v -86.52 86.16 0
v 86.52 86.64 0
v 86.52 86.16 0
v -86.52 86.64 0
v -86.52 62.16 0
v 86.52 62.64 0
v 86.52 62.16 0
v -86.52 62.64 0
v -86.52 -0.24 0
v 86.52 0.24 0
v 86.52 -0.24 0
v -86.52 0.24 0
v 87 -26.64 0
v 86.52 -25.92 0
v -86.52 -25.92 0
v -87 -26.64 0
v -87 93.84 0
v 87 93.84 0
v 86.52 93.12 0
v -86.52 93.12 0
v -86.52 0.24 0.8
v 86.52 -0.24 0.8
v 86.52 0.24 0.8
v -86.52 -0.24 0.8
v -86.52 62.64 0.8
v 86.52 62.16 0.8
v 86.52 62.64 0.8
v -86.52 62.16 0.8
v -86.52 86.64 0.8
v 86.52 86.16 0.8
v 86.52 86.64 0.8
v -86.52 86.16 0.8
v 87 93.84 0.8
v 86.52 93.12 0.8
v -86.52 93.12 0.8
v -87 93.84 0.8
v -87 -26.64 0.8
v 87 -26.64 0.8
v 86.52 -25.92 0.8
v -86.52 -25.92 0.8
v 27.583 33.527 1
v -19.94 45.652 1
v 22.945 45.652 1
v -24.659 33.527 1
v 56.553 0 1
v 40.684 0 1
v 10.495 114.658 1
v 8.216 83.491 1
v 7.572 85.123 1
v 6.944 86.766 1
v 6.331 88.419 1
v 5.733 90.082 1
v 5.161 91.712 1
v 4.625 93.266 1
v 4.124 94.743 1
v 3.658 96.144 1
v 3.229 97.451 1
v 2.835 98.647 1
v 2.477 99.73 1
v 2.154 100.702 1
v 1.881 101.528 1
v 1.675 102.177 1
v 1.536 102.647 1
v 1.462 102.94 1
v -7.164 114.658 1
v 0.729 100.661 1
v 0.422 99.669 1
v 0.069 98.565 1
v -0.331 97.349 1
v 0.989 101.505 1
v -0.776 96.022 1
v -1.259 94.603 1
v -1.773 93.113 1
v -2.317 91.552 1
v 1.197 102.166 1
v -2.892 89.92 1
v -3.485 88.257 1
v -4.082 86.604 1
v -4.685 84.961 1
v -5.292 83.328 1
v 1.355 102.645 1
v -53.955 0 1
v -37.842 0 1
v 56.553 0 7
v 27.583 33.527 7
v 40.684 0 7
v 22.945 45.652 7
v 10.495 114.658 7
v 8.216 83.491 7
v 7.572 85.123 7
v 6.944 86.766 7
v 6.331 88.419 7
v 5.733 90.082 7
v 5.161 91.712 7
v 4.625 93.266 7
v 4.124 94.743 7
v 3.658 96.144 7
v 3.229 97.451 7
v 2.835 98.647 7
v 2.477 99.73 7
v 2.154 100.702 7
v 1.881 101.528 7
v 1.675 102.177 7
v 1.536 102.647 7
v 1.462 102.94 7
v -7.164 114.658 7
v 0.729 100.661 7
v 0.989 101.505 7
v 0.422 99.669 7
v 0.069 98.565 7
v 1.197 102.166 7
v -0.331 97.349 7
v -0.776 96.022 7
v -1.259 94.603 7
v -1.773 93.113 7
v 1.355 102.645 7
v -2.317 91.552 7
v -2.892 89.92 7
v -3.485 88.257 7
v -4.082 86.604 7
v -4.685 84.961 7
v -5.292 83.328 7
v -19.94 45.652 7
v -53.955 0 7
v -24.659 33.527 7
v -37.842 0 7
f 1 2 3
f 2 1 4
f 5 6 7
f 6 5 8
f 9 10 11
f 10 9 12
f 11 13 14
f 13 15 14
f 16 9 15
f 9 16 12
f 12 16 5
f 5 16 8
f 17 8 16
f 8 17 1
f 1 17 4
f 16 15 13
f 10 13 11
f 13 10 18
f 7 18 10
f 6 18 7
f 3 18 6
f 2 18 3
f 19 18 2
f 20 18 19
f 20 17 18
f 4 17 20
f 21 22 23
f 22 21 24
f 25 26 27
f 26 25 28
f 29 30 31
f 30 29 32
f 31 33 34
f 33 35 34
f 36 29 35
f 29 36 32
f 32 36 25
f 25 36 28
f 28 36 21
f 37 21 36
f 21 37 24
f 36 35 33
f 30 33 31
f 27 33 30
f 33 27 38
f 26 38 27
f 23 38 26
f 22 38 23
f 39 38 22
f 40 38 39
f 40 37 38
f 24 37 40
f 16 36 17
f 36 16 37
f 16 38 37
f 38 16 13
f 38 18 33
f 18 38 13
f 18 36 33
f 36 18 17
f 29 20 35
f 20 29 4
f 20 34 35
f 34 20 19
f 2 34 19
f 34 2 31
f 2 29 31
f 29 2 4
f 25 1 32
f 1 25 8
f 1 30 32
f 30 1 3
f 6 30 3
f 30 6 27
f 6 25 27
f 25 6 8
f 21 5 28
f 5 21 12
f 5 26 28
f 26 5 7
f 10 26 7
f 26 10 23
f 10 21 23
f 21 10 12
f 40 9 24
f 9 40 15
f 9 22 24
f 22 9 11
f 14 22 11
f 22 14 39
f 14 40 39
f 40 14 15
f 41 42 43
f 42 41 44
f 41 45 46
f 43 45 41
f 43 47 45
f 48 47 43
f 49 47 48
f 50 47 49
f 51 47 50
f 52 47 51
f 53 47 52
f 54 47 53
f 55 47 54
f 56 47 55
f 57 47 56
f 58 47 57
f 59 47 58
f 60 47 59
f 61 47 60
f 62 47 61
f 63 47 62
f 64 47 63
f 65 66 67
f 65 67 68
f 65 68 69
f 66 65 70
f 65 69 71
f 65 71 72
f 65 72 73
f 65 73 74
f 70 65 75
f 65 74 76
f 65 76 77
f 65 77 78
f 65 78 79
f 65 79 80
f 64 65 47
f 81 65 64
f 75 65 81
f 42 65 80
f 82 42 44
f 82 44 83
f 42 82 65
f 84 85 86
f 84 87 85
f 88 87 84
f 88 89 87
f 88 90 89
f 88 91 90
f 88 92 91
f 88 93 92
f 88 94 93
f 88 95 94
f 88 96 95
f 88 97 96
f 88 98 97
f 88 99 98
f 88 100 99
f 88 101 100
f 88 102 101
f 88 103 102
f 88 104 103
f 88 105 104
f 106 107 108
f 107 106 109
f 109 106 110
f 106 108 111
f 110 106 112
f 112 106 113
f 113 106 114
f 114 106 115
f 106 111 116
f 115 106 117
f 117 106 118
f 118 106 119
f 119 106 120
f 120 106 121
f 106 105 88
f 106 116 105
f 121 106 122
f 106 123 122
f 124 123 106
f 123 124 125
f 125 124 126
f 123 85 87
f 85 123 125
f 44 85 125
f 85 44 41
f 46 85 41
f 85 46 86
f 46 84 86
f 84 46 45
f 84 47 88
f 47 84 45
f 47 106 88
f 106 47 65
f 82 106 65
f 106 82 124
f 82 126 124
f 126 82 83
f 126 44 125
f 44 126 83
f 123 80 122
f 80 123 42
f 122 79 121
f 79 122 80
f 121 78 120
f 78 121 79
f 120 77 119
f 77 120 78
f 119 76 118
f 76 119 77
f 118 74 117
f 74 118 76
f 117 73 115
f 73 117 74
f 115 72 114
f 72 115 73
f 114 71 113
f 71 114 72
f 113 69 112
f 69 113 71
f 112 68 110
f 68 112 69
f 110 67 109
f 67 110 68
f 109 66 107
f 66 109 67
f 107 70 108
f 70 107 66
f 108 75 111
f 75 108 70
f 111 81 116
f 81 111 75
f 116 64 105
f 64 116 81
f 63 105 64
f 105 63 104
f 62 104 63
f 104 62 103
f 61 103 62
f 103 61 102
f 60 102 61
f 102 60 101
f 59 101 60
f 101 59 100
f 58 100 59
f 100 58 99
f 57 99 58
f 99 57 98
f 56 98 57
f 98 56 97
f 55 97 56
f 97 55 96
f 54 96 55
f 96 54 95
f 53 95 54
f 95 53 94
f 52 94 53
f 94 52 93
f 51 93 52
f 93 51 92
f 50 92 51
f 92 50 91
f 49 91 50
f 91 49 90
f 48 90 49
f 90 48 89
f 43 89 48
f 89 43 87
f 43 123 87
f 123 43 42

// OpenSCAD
// file: ../geometry/contact_sheet.scad
//////////////////////////////////////////////////////////////////////
// LibFile: contact_sheet.scad
// Project: Glyph Dossier
// FileGroup: Diagnostic Rendering
// FileSummary: Representative-set preview grid.
//////////////////////////////////////////////////////////////////////

module _contact_cell_frame(cell_size, depth) {
    frame_thickness = 0.8;

    color([0.35, 0.40, 0.48, 0.35])
        linear_extrude(height = depth)
            difference() {
                square(
                    [cell_size, cell_size],
                    center = true
                );
                square(
                    [
                        cell_size - 2 * frame_thickness,
                        cell_size - 2 * frame_thickness
                    ],
                    center = true
                );
            }
}

module glyph_contact_sheet(
    ids,
    records,
    source_kind,
    font_name,
    columns,
    cell_size,
    glyph_size,
    depth
) {
    rows = ceil(len(ids) / columns);

    for (index = [0 : len(ids) - 1]) {
        row = floor(index / columns);
        column = index % columns;
        x = (column - (columns - 1) / 2) * cell_size;
        y = ((rows - 1) / 2 - row) * cell_size;
        dossier = named_record(
            records,
            ids[index],
            "contact-sheet dossier"
        );

        translate([x, y, 0]) {
            _contact_cell_frame(cell_size, 0.6);

            color([0.88, 0.68, 0.24])
                translate([0, -glyph_size * 0.25, 0.8])
                    glyph_profile_3d(
                        dossier,
                        source_kind,
                        font_name,
                        glyph_size,
                        depth
                    );
        }
    }
}
// file: ../geometry/dossier_scene.scad
//////////////////////////////////////////////////////////////////////
// LibFile: dossier_scene.scad
// Project: Glyph Dossier
// FileGroup: Diagnostic Rendering
// FileSummary: Individual profile and guide-frame render modes.
//////////////////////////////////////////////////////////////////////

module render_glyph_dossier(
    dossier,
    render_mode,
    source_kind,
    font_name,
    nominal_size,
    extrusion_depth,
    guide_depth,
    show_guides,
    show_frame,
    x_height_ratio,
    cap_height_ratio,
    ascender_ratio,
    descender_ratio
) {
    if (render_mode == "profile_2d") {
        glyph_source_2d(
            dossier,
            source_kind,
            font_name,
            nominal_size
        );
    } else if (render_mode == "profile_3d") {
        glyph_profile_3d(
            dossier,
            source_kind,
            font_name,
            nominal_size,
            extrusion_depth
        );
    } else if (render_mode == "dossier") {
        if (show_guides)
            color([0.45, 0.55, 0.70, 0.45])
                nominal_guides_3d(
                    nominal_size,
                    guide_depth,
                    x_height_ratio,
                    cap_height_ratio,
                    ascender_ratio,
                    descender_ratio,
                    show_frame
                );

        color([0.88, 0.68, 0.24])
            translate([0, 0, guide_depth + 0.2])
                glyph_profile_3d(
                    dossier,
                    source_kind,
                    font_name,
                    nominal_size,
                    extrusion_depth
                );
    }
}
// file: ../geometry/analysis_guides.scad
//////////////////////////////////////////////////////////////////////
// LibFile: analysis_guides.scad
// Project: Glyph Dossier
// FileGroup: Diagnostic Geometry
// FileSummary: Nominal, non-measured baseline and height guides.
//////////////////////////////////////////////////////////////////////

module _guide_line_2d(width, thickness, y) {
    translate([0, y])
        square([width, thickness], center = true);
}

module nominal_guides_2d(
    nominal_size,
    x_height_ratio,
    cap_height_ratio,
    ascender_ratio,
    descender_ratio,
    show_frame = true
) {
    guide_width = nominal_size * 1.45;
    thickness = max(0.35, nominal_size * 0.004);
    lower = -nominal_size * descender_ratio;
    upper = nominal_size * ascender_ratio;

    union() {
        _guide_line_2d(guide_width, thickness, 0);
        _guide_line_2d(
            guide_width,
            thickness,
            nominal_size * x_height_ratio
        );
        _guide_line_2d(
            guide_width,
            thickness,
            nominal_size * cap_height_ratio
        );
        _guide_line_2d(guide_width, thickness, upper);
        _guide_line_2d(guide_width, thickness, lower);

        if (show_frame)
            difference() {
                translate([0, (upper + lower) / 2])
                    square(
                        [guide_width, upper - lower],
                        center = true
                    );
                translate([0, (upper + lower) / 2])
                    square(
                        [
                            guide_width - 2 * thickness,
                            upper - lower - 2 * thickness
                        ],
                        center = true
                    );
            }
    }
}

module nominal_guides_3d(
    nominal_size,
    depth,
    x_height_ratio,
    cap_height_ratio,
    ascender_ratio,
    descender_ratio,
    show_frame = true
) {
    linear_extrude(height = depth)
        nominal_guides_2d(
            nominal_size,
            x_height_ratio,
            cap_height_ratio,
            ascender_ratio,
            descender_ratio,
            show_frame
        );
}
// file: ../geometry/glyph_profile.scad
//////////////////////////////////////////////////////////////////////
// LibFile: glyph_profile.scad
// Project: Glyph Dossier
// FileGroup: Source Adapter
// FileSummary: Font-backed 2D and extruded glyph profiles.
//////////////////////////////////////////////////////////////////////

module font_glyph_2d(glyph, font_name, nominal_size) {
    if (font_name == "")
        text(
            text = glyph,
            size = nominal_size,
            halign = "center",
            valign = "baseline"
        );
    else
        text(
            text = glyph,
            size = nominal_size,
            font = font_name,
            halign = "center",
            valign = "baseline"
        );
}

module glyph_source_2d(
    dossier,
    source_kind,
    font_name,
    nominal_size
) {
    assert(
        source_kind == "font",
        str("Batch 001 does not implement source kind: ", source_kind)
    );

    font_glyph_2d(
        dossier[GD_GLYPH],
        font_name,
        nominal_size
    );
}

module glyph_profile_3d(
    dossier,
    source_kind,
    font_name,
    nominal_size,
    depth
) {
    linear_extrude(height = depth)
        glyph_source_2d(
            dossier,
            source_kind,
            font_name,
            nominal_size
        );
}
// file: ../lib/reporting.scad
//////////////////////////////////////////////////////////////////////
// LibFile: reporting.scad
// Project: Glyph Dossier
// FileGroup: Console Reporting
// FileSummary: Reports project, source, dossier, and study-set data.
//////////////////////////////////////////////////////////////////////

module report_project(project, report_level = "full") {
    echo("GLYPH_DOSSIER_PROJECT", project[PR_NAME]);
    echo("GLYPH_DOSSIER_KIND", project[PR_KIND]);
    echo("GLYPH_DOSSIER_EDITION", project[PR_EDITION]);
    echo("GLYPH_DOSSIER_BASELINE", project[PR_BASELINE]);

    if (report_level == "full") {
        echo("GLYPH_DOSSIER_SCOPE", project[PR_SCOPE]);
        echo("GLYPH_DOSSIER_STATUS", project[PR_STATUS]);
    }
}

module report_catalog_notice(project) {
    echo("GLYPH_DOSSIER_CATALOG", project[PR_STATUS]);
}

module report_source(
    source_kind,
    font_name,
    font_license,
    font_source_url,
    font_revision
) {
    echo("GLYPH_SOURCE_KIND", source_kind);
    echo(
        "GLYPH_FONT_NAME",
        font_name == "" ? "OpenSCAD default font" : font_name
    );
    echo("GLYPH_FONT_LICENSE", font_license);
    echo("GLYPH_FONT_SOURCE_URL", font_source_url);
    echo("GLYPH_FONT_REVISION", font_revision);
}

module report_glyph_dossier(dossier, report_level = "full") {
    echo("DOSSIER_ID", dossier[GD_ID]);
    echo("DOSSIER_GLYPH", dossier[GD_GLYPH]);
    echo("DOSSIER_GROUP", dossier[GD_GROUP]);
    echo("DOSSIER_ARCHETYPE", dossier[GD_ARCHETYPE]);
    echo("DOSSIER_COMPONENT_RANGE", [
        dossier[GD_COMPONENTS_MIN],
        dossier[GD_COMPONENTS_MAX]
    ]);
    echo("DOSSIER_COUNTER_RANGE", [
        dossier[GD_COUNTERS_MIN],
        dossier[GD_COUNTERS_MAX]
    ]);
    echo("DOSSIER_VERTICAL_CLASS", dossier[GD_VERTICAL_CLASS]);
    echo("DOSSIER_PRIORITY", dossier[GD_PRIORITY]);

    if (report_level == "full") {
        echo("DOSSIER_FEATURES", dossier[GD_FEATURES]);
        echo("DOSSIER_SECTION_RISKS", dossier[GD_RISKS]);
        echo("DOSSIER_FONT_VARIANTS", dossier[GD_VARIANTS]);
        echo("DOSSIER_NOTE", dossier[GD_NOTE]);
    }
}

module report_study_set(set_name, ids) {
    echo("STUDY_SET_NAME", set_name);
    echo("STUDY_SET_COUNT", len(ids));
    echo("STUDY_SET_IDS", ids);
}
// file: ../lib/validation.scad
//////////////////////////////////////////////////////////////////////
// LibFile: validation.scad
// Project: Glyph Dossier
// FileGroup: Contract Validation
// FileSummary: Validates projects, dossiers, registries, and study sets.
//////////////////////////////////////////////////////////////////////

VALID_GROUPS = [
    "uppercase",
    "lowercase",
    "digit",
    "punctuation"
];

VALID_PRIORITIES = [
    "primary",
    "secondary",
    "coverage"
];

VALID_VERTICAL_CLASSES = [
    "cap",
    "x_height",
    "ascender",
    "descender",
    "x_height_dot",
    "descender_dot",
    "digit_height",
    "cap_punctuation",
    "x_punctuation",
    "descender_punctuation"
];

function count_group(records, group_name) =
    len([
        for (record = records)
            if (record[GD_GROUP] == group_name)
                record
    ]);

module validate_project(project) {
    assert(
        len(project) == 6,
        str("Project record must contain 6 fields; found ", len(project))
    );
    assert(
        project[PR_KIND] == "laboratory"
        || project[PR_KIND] == "catalog_notice",
        str("Unsupported project kind: ", project[PR_KIND])
    );
    assert(len(project[PR_NAME]) > 0, "Project name must not be empty.");
}

module validate_glyph_dossier(dossier) {
    assert(
        len(dossier) == 14,
        str(
            "Glyph dossier must contain 14 fields; found ",
            len(dossier)
        )
    );
    assert(len(dossier[GD_ID]) > 0, "Glyph dossier ID is empty.");
    assert(len(dossier[GD_GLYPH]) == 1,
        str("Glyph must contain one character: ", dossier[GD_ID]));
    assert(value_in_list(VALID_GROUPS, dossier[GD_GROUP]),
        str("Unknown glyph group: ", dossier[GD_GROUP]));
    assert(len(dossier[GD_ARCHETYPE]) > 0,
        str("Archetype is empty: ", dossier[GD_ID]));
    assert(dossier[GD_COMPONENTS_MIN] >= 1,
        str("Component minimum is invalid: ", dossier[GD_ID]));
    assert(
        dossier[GD_COMPONENTS_MAX] >= dossier[GD_COMPONENTS_MIN],
        str("Component range is invalid: ", dossier[GD_ID])
    );
    assert(dossier[GD_COUNTERS_MIN] >= 0,
        str("Counter minimum is invalid: ", dossier[GD_ID]));
    assert(
        dossier[GD_COUNTERS_MAX] >= dossier[GD_COUNTERS_MIN],
        str("Counter range is invalid: ", dossier[GD_ID])
    );
    assert(
        value_in_list(
            VALID_VERTICAL_CLASSES,
            dossier[GD_VERTICAL_CLASS]
        ),
        str(
            "Unknown vertical class ",
            dossier[GD_VERTICAL_CLASS],
            " in ",
            dossier[GD_ID]
        )
    );
    assert(len(dossier[GD_FEATURES]) > 0,
        str("Feature list is empty: ", dossier[GD_ID]));
    assert(len(dossier[GD_RISKS]) > 0,
        str("Risk list is empty: ", dossier[GD_ID]));
    assert(
        value_in_list(VALID_PRIORITIES, dossier[GD_PRIORITY]),
        str("Unknown priority: ", dossier[GD_PRIORITY])
    );
    assert(len(dossier[GD_NOTE]) > 0,
        str("Design note is empty: ", dossier[GD_ID]));
}

module validate_glyph_registry(records) {
    assert(len(records) == 66,
        str("Expected 66 glyph dossiers; found ", len(records)));
    assert(count_group(records, "uppercase") == 26,
        "Uppercase registry must contain 26 dossiers.");
    assert(count_group(records, "lowercase") == 26,
        "Lowercase registry must contain 26 dossiers.");
    assert(count_group(records, "digit") == 10,
        "Digit registry must contain 10 dossiers.");
    assert(count_group(records, "punctuation") == 4,
        "Punctuation registry must contain 4 dossiers.");

    for (record = records) {
        validate_glyph_dossier(record);
        assert(
            exact_name_count(records, record[GD_ID]) == 1,
            str("Duplicate dossier ID: ", record[GD_ID])
        );
    }
}

module validate_id_set(ids, records, set_name) {
    assert(len(ids) > 0, str(set_name, " is empty."));

    for (id = ids)
        assert(
            exact_name_count(records, id) == 1,
            str(
                "Expected one dossier for ",
                id,
                " in ",
                set_name
            )
        );

    for (id = ids)
        assert(
            len([for (candidate = ids) if (candidate == id) candidate])
                == 1,
            str("Duplicate ID in ", set_name, ": ", id)
        );
}
// file: ../lib/lookup.scad
//////////////////////////////////////////////////////////////////////
// LibFile: lookup.scad
// Project: Glyph Dossier
// FileGroup: Exact Lookup
// FileSummary: Requires exactly one matching named record.
//////////////////////////////////////////////////////////////////////

function named_matches(records, name) = [
    for (record = records)
        if (record_name(record) == name)
            record
];

function named_record(records, name, record_kind = "record") =
    let(matches = named_matches(records, name))
    assert(
        len(matches) == 1,
        str(
            "Expected exactly one ",
            record_kind,
            " named ",
            name,
            "; found ",
            len(matches)
        )
    )
    matches[0];

function exact_name_count(records, name) =
    len(named_matches(records, name));
// file: ../config/workbenches.scad
//////////////////////////////////////////////////////////////////////
// LibFile: workbenches.scad
// Project: Glyph Dossier
// FileGroup: Workbench Contracts
// FileSummary: Declares supported workbenches and render modes.
//////////////////////////////////////////////////////////////////////

VALID_WORKBENCHES = [
    "development",
    "laboratory",
    "profile",
    "contact_sheet",
    "catalog"
];

VALID_RENDER_MODES = [
    "dossier",
    "profile_2d",
    "profile_3d",
    "contact_sheet",
    "report_only"
];

VALID_SOURCE_KINDS = [
    "font"
];

function value_in_list(values, value) =
    len([for (candidate = values) if (candidate == value) candidate]) > 0;

module validate_workbench_selection(
    workbench_name,
    render_mode,
    source_kind
) {
    assert(
        value_in_list(VALID_WORKBENCHES, workbench_name),
        str("Unknown workbench: ", workbench_name)
    );
    assert(
        value_in_list(VALID_RENDER_MODES, render_mode),
        str("Unknown render mode: ", render_mode)
    );
    assert(
        value_in_list(VALID_SOURCE_KINDS, source_kind),
        str("Unsupported Batch 001 source kind: ", source_kind)
    );
}
// file: ../config/glyphs.scad
//////////////////////////////////////////////////////////////////////
// LibFile: glyphs.scad
// Project: Glyph Dossier
// FileGroup: Registry Composition
// FileSummary: Exposes the complete character-analysis registry.
//////////////////////////////////////////////////////////////////////

ALL_GLYPHS = concat(
    UPPERCASE_GLYPHS,
    LOWERCASE_GLYPHS,
    DIGIT_GLYPHS,
    PUNCTUATION_GLYPHS
);
// file: ../registries/study_sets.scad
//////////////////////////////////////////////////////////////////////
// LibFile: study_sets.scad
// Project: Glyph Dossier
// FileGroup: Study Registry
// FileSummary: Representative character sets for focused analysis.
//////////////////////////////////////////////////////////////////////

REPRESENTATIVE_SET_IDS = [
    "U_A",
    "U_B",
    "U_O",
    "U_S",
    "U_Z",
    "L_a",
    "L_g",
    "L_i",
    "L_j",
    "L_m",
    "L_s",
    "D_0",
    "D_1",
    "D_2",
    "D_4",
    "D_8",
    "P_question",
    "P_exclamation",
    "P_colon",
    "P_semicolon"
];
// file: ../registries/punctuation.scad
//////////////////////////////////////////////////////////////////////
// LibFile: punctuation_glyphs.scad
// Project: Glyph Dossier
// FileGroup: Character Registry
// FileSummary: Character-level dossiers for question, exclamation, colon, and semicolon.
//////////////////////////////////////////////////////////////////////

PUNCTUATION_GLYPHS = [
    glyph_dossier(
        "P_question",
        "?",
        "punctuation",
        "curved_mark_dot",
        2,
        2,
        0,
        0,
        "cap_punctuation",
        ["upper_curve", "narrow_transition", "terminal", "separate_dot"],
        ["dot_loss", "component_assignment", "curve_cut", "narrow_transition"],
        ["curve_shape", "dot_shape", "terminal_angle"],
        "primary",
        "Primary punctuation test combining a complex main mark and separate dot."
    ),
    glyph_dossier(
        "P_exclamation",
        "!",
        "punctuation",
        "stem_dot",
        2,
        2,
        0,
        0,
        "cap_punctuation",
        ["main_stem", "separate_dot"],
        ["dot_loss", "stem_fragment", "component_assignment"],
        ["tapered_stem", "rectangular_stem", "dot_shape"],
        "primary",
        "Primary two-component punctuation control glyph."
    ),
    glyph_dossier(
        "P_colon",
        ":",
        "punctuation",
        "paired_dots",
        2,
        2,
        0,
        0,
        "x_punctuation",
        ["upper_dot", "lower_dot"],
        ["component_loss", "component_assignment", "small_part"],
        ["round_dots", "square_dots"],
        "primary",
        "Primary test consisting entirely of disconnected small components."
    ),
    glyph_dossier(
        "P_semicolon",
        ";",
        "punctuation",
        "dot_descending_mark",
        2,
        2,
        0,
        0,
        "descender_punctuation",
        ["upper_dot", "lower_comma_tail"],
        ["component_loss", "tail_fragment", "component_assignment"],
        ["tail_angle", "dot_shape"],
        "primary",
        "Tests disconnected punctuation with a descending curved component."
    )
];
// file: ../registries/digits.scad
//////////////////////////////////////////////////////////////////////
// LibFile: digit_glyphs.scad
// Project: Glyph Dossier
// FileGroup: Character Registry
// FileSummary: Character-level dossiers for digits 0 through 9.
//////////////////////////////////////////////////////////////////////

DIGIT_GLYPHS = [
    glyph_dossier(
        "D_0",
        "0",
        "digit",
        "closed_ring",
        1,
        1,
        1,
        1,
        "digit_height",
        ["outer_curve", "counter", "continuous_ring"],
        ["counter_collapse", "ring_thickness_loss", "letter_confusion"],
        ["slashed_zero", "dotted_zero", "oval_width"],
        "primary",
        "Primary digit ring test and distinction from uppercase O."
    ),
    glyph_dossier(
        "D_1",
        "1",
        "digit",
        "stem_flag_base",
        1,
        1,
        0,
        0,
        "digit_height",
        ["main_stem", "possible_flag", "possible_base"],
        ["narrow_part", "flag_fragment", "base_fragment"],
        ["plain_stem", "top_flag", "bottom_base", "serifed"],
        "primary",
        "Primary font-variation and narrow-digit test."
    ),
    glyph_dossier(
        "D_2",
        "2",
        "digit",
        "curve_diagonal_base",
        1,
        1,
        0,
        0,
        "digit_height",
        ["upper_curve", "diagonal_transition", "bottom_bar"],
        ["curve_diagonal_cut", "bottom_bar_fragment", "thin_transition"],
        ["flat_or_curved_base", "diagonal_angle"],
        "primary",
        "Primary mixed curve, diagonal, and horizontal test."
    ),
    glyph_dossier(
        "D_3",
        "3",
        "digit",
        "double_open_bowl",
        1,
        1,
        0,
        0,
        "digit_height",
        ["upper_curve", "lower_curve", "central_waist"],
        ["waist_fragment", "curve_cut", "terminal_fragment"],
        ["upper_lower_balance", "flat_or_rounded_spine"],
        "coverage",
        "Tests two open curved lobes and a narrow waist."
    ),
    glyph_dossier(
        "D_4",
        "4",
        "digit",
        "crossbar_diagonal_stem",
        1,
        1,
        0,
        1,
        "digit_height",
        ["diagonal", "vertical_stem", "crossbar", "possible_counter"],
        ["form_substitution", "crossbar_cut", "counter_collapse", "junction_cut"],
        ["open_four", "closed_four", "crossbar_height"],
        "primary",
        "Primary digit form-variation and junction test."
    ),
    glyph_dossier(
        "D_5",
        "5",
        "digit",
        "top_stem_lower_curve",
        1,
        1,
        0,
        0,
        "digit_height",
        ["top_bar", "upper_stem", "lower_curve"],
        ["curve_stem_cut", "top_bar_fragment", "waist_fragment"],
        ["flat_or_curved_top", "lower_bowl_size"],
        "coverage",
        "Tests abrupt transition from rectilinear to curved geometry."
    ),
    glyph_dossier(
        "D_6",
        "6",
        "digit",
        "loop_open_tail",
        1,
        1,
        1,
        1,
        "digit_height",
        ["lower_loop", "counter", "upper_open_curve"],
        ["counter_collapse", "neck_cut", "terminal_fragment"],
        ["loop_size", "terminal_angle"],
        "coverage",
        "Tests one counter with an open upper continuation."
    ),
    glyph_dossier(
        "D_7",
        "7",
        "digit",
        "topbar_diagonal",
        1,
        1,
        0,
        0,
        "digit_height",
        ["top_bar", "long_diagonal", "possible_crossbar"],
        ["diagonal_cut", "top_bar_fragment", "crossbar_fragment"],
        ["crossed_seven", "plain_seven", "serifed"],
        "coverage",
        "Tests a long diagonal and optional crossbar."
    ),
    glyph_dossier(
        "D_8",
        "8",
        "digit",
        "double_closed_loop",
        1,
        1,
        2,
        2,
        "digit_height",
        ["upper_loop", "lower_loop", "two_counters", "central_waist"],
        ["counter_collapse", "waist_fragment", "loop_boundary_cut"],
        ["upper_lower_balance", "waist_width"],
        "primary",
        "Primary two-counter digit test."
    ),
    glyph_dossier(
        "D_9",
        "9",
        "digit",
        "loop_descending_tail",
        1,
        1,
        1,
        1,
        "digit_height",
        ["upper_loop", "counter", "lower_open_tail"],
        ["counter_collapse", "neck_cut", "tail_fragment"],
        ["loop_size", "tail_angle"],
        "coverage",
        "Tests one upper counter with a descending open continuation."
    )
];
// file: ../config/projects.scad
//////////////////////////////////////////////////////////////////////
// LibFile: projects.scad
// Project: Glyph Dossier
// FileGroup: Registry Routing
// FileSummary: Exposes the active project registry.
//////////////////////////////////////////////////////////////////////

PROJECTS = wb_workbench_name == "catalog"
    ? CATALOG_PROJECTS
    : LABORATORY_PROJECTS;
// file: ../registries/catalog_projects.scad
//////////////////////////////////////////////////////////////////////
// LibFile: catalog_projects.scad
// Project: Glyph Dossier
// FileGroup: Read-Only Registry
// FileSummary: Catalog remains empty until physical acceptance.
//////////////////////////////////////////////////////////////////////

CATALOG_PROJECTS = [
    glyph_project(
        "NO_ACCEPTED_GLYPH_OBJECTS",
        "catalog_notice",
        "0.1.0",
        "Physically accepted source-specific glyph objects.",
        "commit-7940732-batch-001",
        "No accepted glyph objects."
    )
];
// file: ../registries/laboratory_projects.scad
//////////////////////////////////////////////////////////////////////
// LibFile: laboratory_projects.scad
// Project: Glyph Dossier
// FileGroup: Mutable Registry
// FileSummary: Active analysis project.
//////////////////////////////////////////////////////////////////////

LABORATORY_PROJECTS = [
    glyph_project(
        "GLYPH_DOSSIER_LAB",
        "laboratory",
        "0.1.0",
        "Character anatomy and risk analysis before sectioning.",
        "commit-7940732-batch-001",
        "Analysis registry active; no physical objects accepted."
    )
];
// file: ../lib/schema.scad
//////////////////////////////////////////////////////////////////////
// LibFile: schema.scad
// Project: Glyph Dossier
// FileGroup: Record Schema
// FileSummary: Project and glyph dossier constructors and indexes.
//////////////////////////////////////////////////////////////////////

PR_NAME = 0;
PR_KIND = 1;
PR_EDITION = 2;
PR_SCOPE = 3;
PR_BASELINE = 4;
PR_STATUS = 5;

function glyph_project(
    name,
    kind,
    edition,
    scope,
    baseline,
    status
) = [
    name,
    kind,
    edition,
    scope,
    baseline,
    status
];

GD_ID = 0;
GD_GLYPH = 1;
GD_GROUP = 2;
GD_ARCHETYPE = 3;
GD_COMPONENTS_MIN = 4;
GD_COMPONENTS_MAX = 5;
GD_COUNTERS_MIN = 6;
GD_COUNTERS_MAX = 7;
GD_VERTICAL_CLASS = 8;
GD_FEATURES = 9;
GD_RISKS = 10;
GD_VARIANTS = 11;
GD_PRIORITY = 12;
GD_NOTE = 13;

function glyph_dossier(
    id,
    glyph,
    group,
    archetype,
    components_min,
    components_max,
    counters_min,
    counters_max,
    vertical_class,
    features,
    risks,
    variants,
    priority,
    note
) = [
    id,
    glyph,
    group,
    archetype,
    components_min,
    components_max,
    counters_min,
    counters_max,
    vertical_class,
    features,
    risks,
    variants,
    priority,
    note
];

function record_name(record) = record[0];
// file: ../config/defaults.scad
//////////////////////////////////////////////////////////////////////
// LibFile: defaults.scad
// Project: Glyph Dossier
// FileGroup: Workbench Configuration
// FileSummary: Resolves wrapper inputs into stable wb_* values.
//////////////////////////////////////////////////////////////////////

wb_workbench_name = is_undef(workbench_name)
    ? "development" : workbench_name;
wb_project_name = is_undef(project_name_selected)
    ? "GLYPH_DOSSIER_LAB" : project_name_selected;
wb_glyph_id = is_undef(glyph_id_selected)
    ? "U_A" : glyph_id_selected;
wb_render_mode = is_undef(render_mode)
    ? "dossier" : render_mode;
wb_report_level = is_undef(report_level)
    ? "full" : report_level;

wb_source_kind = is_undef(source_kind)
    ? "font" : source_kind;
wb_font_name = is_undef(font_name)
    ? "" : font_name;
wb_font_license = is_undef(font_license)
    ? "unrecorded" : font_license;
wb_font_source_url = is_undef(font_source_url)
    ? "" : font_source_url;
wb_font_revision = is_undef(font_revision)
    ? "" : font_revision;

wb_nominal_size = is_undef(nominal_size)
    ? 120 : nominal_size;
wb_extrusion_depth = is_undef(extrusion_depth)
    ? 6 : extrusion_depth;
wb_guide_depth = is_undef(guide_depth)
    ? 0.8 : guide_depth;
wb_show_guides = is_undef(show_guides)
    ? true : show_guides;
wb_show_frame = is_undef(show_frame)
    ? true : show_frame;

wb_x_height_ratio = is_undef(x_height_ratio)
    ? 0.52 : x_height_ratio;
wb_cap_height_ratio = is_undef(cap_height_ratio)
    ? 0.72 : cap_height_ratio;
wb_ascender_ratio = is_undef(ascender_ratio)
    ? 0.78 : ascender_ratio;
wb_descender_ratio = is_undef(descender_ratio)
    ? 0.22 : descender_ratio;

wb_sheet_columns = is_undef(sheet_columns)
    ? 5 : sheet_columns;
wb_sheet_cell_size = is_undef(sheet_cell_size)
    ? 72 : sheet_cell_size;
wb_sheet_glyph_size = is_undef(sheet_glyph_size)
    ? 42 : sheet_glyph_size;
wb_sheet_depth = is_undef(sheet_depth)
    ? 2 : sheet_depth;
// file: ../main.scad
//////////////////////////////////////////////////////////////////////
// LibFile: main.scad
// Project: Glyph Dossier
// FileGroup: Shared Workbench Orchestrator
// FileSummary: Resolves, validates, reports, and dispatches analysis.
//////////////////////////////////////////////////////////////////////

include <config/defaults.scad>
include <lib/schema.scad>
include <registries/laboratory_projects.scad>
include <registries/catalog_projects.scad>
include <config/projects.scad>

include <registries/uppercase.scad>
include <registries/lowercase.scad>
include <registries/digits.scad>
include <registries/punctuation.scad>
include <registries/study_sets.scad>
include <config/glyphs.scad>

include <config/workbenches.scad>
include <lib/lookup.scad>
include <lib/validation.scad>
include <lib/reporting.scad>
include <geometry/glyph_profile.scad>
include <geometry/analysis_guides.scad>
include <geometry/dossier_scene.scad>
include <geometry/contact_sheet.scad>

module run_glyph_dossier() {
    validate_workbench_selection(
        wb_workbench_name,
        wb_render_mode,
        wb_source_kind
    );

    project = named_record(
        PROJECTS,
        wb_project_name,
        "Glyph Dossier project"
    );

    validate_project(project);
    validate_glyph_registry(ALL_GLYPHS);
    report_project(project, wb_report_level);
    report_source(
        wb_source_kind,
        wb_font_name,
        wb_font_license,
        wb_font_source_url,
        wb_font_revision
    );

    if (project[PR_KIND] == "catalog_notice") {
        report_catalog_notice(project);
    } else if (wb_render_mode == "contact_sheet") {
        validate_id_set(
            REPRESENTATIVE_SET_IDS,
            ALL_GLYPHS,
            "representative study set"
        );
        report_study_set(
            "REPRESENTATIVE_SET",
            REPRESENTATIVE_SET_IDS
        );
        glyph_contact_sheet(
            REPRESENTATIVE_SET_IDS,
            ALL_GLYPHS,
            wb_source_kind,
            wb_font_name,
            wb_sheet_columns,
            wb_sheet_cell_size,
            wb_sheet_glyph_size,
            wb_sheet_depth
        );
    } else {
        dossier = named_record(
            ALL_GLYPHS,
            wb_glyph_id,
            "glyph dossier"
        );

        validate_glyph_dossier(dossier);
        report_glyph_dossier(dossier, wb_report_level);

        if (wb_render_mode != "report_only")
            render_glyph_dossier(
                dossier,
                wb_render_mode,
                wb_source_kind,
                wb_font_name,
                wb_nominal_size,
                wb_extrusion_depth,
                wb_guide_depth,
                wb_show_guides,
                wb_show_frame,
                wb_x_height_ratio,
                wb_cap_height_ratio,
                wb_ascender_ratio,
                wb_descender_ratio
            );
    }
}

run_glyph_dossier();
// main file
//////////////////////////////////////////////////////////////////////
// LibFile: laboratory.scad
// Project: Glyph Dossier
// FileGroup: Executable Workbench
// FileSummary: Main individual-character analysis workbench.
//////////////////////////////////////////////////////////////////////

/* [View] */
render_mode = "dossier"; // [dossier,profile_2d,profile_3d,report_only]
report_level = "full"; // [full,summary]

/* [Character] */
glyph_id_selected = "U_A";

/* [Source] */
source_kind = "font";
font_name = "";
font_license = "unrecorded";
font_source_url = "";
font_revision = "";

/* [Profile] */
nominal_size = 120;
extrusion_depth = 6;

/* [Nominal analysis guides] */
guide_depth = 0.8;
show_guides = true;
show_frame = true;
x_height_ratio = 0.52;
cap_height_ratio = 0.72;
ascender_ratio = 0.78;
descender_ratio = 0.22;

/* [Contact sheet] */
sheet_columns = 5;
sheet_cell_size = 72;
sheet_glyph_size = 42;
sheet_depth = 2;


/* [Hidden] */
workbench_name = "laboratory";
project_name_selected = "GLYPH_DOSSIER_LAB";

include <../main.scad>
